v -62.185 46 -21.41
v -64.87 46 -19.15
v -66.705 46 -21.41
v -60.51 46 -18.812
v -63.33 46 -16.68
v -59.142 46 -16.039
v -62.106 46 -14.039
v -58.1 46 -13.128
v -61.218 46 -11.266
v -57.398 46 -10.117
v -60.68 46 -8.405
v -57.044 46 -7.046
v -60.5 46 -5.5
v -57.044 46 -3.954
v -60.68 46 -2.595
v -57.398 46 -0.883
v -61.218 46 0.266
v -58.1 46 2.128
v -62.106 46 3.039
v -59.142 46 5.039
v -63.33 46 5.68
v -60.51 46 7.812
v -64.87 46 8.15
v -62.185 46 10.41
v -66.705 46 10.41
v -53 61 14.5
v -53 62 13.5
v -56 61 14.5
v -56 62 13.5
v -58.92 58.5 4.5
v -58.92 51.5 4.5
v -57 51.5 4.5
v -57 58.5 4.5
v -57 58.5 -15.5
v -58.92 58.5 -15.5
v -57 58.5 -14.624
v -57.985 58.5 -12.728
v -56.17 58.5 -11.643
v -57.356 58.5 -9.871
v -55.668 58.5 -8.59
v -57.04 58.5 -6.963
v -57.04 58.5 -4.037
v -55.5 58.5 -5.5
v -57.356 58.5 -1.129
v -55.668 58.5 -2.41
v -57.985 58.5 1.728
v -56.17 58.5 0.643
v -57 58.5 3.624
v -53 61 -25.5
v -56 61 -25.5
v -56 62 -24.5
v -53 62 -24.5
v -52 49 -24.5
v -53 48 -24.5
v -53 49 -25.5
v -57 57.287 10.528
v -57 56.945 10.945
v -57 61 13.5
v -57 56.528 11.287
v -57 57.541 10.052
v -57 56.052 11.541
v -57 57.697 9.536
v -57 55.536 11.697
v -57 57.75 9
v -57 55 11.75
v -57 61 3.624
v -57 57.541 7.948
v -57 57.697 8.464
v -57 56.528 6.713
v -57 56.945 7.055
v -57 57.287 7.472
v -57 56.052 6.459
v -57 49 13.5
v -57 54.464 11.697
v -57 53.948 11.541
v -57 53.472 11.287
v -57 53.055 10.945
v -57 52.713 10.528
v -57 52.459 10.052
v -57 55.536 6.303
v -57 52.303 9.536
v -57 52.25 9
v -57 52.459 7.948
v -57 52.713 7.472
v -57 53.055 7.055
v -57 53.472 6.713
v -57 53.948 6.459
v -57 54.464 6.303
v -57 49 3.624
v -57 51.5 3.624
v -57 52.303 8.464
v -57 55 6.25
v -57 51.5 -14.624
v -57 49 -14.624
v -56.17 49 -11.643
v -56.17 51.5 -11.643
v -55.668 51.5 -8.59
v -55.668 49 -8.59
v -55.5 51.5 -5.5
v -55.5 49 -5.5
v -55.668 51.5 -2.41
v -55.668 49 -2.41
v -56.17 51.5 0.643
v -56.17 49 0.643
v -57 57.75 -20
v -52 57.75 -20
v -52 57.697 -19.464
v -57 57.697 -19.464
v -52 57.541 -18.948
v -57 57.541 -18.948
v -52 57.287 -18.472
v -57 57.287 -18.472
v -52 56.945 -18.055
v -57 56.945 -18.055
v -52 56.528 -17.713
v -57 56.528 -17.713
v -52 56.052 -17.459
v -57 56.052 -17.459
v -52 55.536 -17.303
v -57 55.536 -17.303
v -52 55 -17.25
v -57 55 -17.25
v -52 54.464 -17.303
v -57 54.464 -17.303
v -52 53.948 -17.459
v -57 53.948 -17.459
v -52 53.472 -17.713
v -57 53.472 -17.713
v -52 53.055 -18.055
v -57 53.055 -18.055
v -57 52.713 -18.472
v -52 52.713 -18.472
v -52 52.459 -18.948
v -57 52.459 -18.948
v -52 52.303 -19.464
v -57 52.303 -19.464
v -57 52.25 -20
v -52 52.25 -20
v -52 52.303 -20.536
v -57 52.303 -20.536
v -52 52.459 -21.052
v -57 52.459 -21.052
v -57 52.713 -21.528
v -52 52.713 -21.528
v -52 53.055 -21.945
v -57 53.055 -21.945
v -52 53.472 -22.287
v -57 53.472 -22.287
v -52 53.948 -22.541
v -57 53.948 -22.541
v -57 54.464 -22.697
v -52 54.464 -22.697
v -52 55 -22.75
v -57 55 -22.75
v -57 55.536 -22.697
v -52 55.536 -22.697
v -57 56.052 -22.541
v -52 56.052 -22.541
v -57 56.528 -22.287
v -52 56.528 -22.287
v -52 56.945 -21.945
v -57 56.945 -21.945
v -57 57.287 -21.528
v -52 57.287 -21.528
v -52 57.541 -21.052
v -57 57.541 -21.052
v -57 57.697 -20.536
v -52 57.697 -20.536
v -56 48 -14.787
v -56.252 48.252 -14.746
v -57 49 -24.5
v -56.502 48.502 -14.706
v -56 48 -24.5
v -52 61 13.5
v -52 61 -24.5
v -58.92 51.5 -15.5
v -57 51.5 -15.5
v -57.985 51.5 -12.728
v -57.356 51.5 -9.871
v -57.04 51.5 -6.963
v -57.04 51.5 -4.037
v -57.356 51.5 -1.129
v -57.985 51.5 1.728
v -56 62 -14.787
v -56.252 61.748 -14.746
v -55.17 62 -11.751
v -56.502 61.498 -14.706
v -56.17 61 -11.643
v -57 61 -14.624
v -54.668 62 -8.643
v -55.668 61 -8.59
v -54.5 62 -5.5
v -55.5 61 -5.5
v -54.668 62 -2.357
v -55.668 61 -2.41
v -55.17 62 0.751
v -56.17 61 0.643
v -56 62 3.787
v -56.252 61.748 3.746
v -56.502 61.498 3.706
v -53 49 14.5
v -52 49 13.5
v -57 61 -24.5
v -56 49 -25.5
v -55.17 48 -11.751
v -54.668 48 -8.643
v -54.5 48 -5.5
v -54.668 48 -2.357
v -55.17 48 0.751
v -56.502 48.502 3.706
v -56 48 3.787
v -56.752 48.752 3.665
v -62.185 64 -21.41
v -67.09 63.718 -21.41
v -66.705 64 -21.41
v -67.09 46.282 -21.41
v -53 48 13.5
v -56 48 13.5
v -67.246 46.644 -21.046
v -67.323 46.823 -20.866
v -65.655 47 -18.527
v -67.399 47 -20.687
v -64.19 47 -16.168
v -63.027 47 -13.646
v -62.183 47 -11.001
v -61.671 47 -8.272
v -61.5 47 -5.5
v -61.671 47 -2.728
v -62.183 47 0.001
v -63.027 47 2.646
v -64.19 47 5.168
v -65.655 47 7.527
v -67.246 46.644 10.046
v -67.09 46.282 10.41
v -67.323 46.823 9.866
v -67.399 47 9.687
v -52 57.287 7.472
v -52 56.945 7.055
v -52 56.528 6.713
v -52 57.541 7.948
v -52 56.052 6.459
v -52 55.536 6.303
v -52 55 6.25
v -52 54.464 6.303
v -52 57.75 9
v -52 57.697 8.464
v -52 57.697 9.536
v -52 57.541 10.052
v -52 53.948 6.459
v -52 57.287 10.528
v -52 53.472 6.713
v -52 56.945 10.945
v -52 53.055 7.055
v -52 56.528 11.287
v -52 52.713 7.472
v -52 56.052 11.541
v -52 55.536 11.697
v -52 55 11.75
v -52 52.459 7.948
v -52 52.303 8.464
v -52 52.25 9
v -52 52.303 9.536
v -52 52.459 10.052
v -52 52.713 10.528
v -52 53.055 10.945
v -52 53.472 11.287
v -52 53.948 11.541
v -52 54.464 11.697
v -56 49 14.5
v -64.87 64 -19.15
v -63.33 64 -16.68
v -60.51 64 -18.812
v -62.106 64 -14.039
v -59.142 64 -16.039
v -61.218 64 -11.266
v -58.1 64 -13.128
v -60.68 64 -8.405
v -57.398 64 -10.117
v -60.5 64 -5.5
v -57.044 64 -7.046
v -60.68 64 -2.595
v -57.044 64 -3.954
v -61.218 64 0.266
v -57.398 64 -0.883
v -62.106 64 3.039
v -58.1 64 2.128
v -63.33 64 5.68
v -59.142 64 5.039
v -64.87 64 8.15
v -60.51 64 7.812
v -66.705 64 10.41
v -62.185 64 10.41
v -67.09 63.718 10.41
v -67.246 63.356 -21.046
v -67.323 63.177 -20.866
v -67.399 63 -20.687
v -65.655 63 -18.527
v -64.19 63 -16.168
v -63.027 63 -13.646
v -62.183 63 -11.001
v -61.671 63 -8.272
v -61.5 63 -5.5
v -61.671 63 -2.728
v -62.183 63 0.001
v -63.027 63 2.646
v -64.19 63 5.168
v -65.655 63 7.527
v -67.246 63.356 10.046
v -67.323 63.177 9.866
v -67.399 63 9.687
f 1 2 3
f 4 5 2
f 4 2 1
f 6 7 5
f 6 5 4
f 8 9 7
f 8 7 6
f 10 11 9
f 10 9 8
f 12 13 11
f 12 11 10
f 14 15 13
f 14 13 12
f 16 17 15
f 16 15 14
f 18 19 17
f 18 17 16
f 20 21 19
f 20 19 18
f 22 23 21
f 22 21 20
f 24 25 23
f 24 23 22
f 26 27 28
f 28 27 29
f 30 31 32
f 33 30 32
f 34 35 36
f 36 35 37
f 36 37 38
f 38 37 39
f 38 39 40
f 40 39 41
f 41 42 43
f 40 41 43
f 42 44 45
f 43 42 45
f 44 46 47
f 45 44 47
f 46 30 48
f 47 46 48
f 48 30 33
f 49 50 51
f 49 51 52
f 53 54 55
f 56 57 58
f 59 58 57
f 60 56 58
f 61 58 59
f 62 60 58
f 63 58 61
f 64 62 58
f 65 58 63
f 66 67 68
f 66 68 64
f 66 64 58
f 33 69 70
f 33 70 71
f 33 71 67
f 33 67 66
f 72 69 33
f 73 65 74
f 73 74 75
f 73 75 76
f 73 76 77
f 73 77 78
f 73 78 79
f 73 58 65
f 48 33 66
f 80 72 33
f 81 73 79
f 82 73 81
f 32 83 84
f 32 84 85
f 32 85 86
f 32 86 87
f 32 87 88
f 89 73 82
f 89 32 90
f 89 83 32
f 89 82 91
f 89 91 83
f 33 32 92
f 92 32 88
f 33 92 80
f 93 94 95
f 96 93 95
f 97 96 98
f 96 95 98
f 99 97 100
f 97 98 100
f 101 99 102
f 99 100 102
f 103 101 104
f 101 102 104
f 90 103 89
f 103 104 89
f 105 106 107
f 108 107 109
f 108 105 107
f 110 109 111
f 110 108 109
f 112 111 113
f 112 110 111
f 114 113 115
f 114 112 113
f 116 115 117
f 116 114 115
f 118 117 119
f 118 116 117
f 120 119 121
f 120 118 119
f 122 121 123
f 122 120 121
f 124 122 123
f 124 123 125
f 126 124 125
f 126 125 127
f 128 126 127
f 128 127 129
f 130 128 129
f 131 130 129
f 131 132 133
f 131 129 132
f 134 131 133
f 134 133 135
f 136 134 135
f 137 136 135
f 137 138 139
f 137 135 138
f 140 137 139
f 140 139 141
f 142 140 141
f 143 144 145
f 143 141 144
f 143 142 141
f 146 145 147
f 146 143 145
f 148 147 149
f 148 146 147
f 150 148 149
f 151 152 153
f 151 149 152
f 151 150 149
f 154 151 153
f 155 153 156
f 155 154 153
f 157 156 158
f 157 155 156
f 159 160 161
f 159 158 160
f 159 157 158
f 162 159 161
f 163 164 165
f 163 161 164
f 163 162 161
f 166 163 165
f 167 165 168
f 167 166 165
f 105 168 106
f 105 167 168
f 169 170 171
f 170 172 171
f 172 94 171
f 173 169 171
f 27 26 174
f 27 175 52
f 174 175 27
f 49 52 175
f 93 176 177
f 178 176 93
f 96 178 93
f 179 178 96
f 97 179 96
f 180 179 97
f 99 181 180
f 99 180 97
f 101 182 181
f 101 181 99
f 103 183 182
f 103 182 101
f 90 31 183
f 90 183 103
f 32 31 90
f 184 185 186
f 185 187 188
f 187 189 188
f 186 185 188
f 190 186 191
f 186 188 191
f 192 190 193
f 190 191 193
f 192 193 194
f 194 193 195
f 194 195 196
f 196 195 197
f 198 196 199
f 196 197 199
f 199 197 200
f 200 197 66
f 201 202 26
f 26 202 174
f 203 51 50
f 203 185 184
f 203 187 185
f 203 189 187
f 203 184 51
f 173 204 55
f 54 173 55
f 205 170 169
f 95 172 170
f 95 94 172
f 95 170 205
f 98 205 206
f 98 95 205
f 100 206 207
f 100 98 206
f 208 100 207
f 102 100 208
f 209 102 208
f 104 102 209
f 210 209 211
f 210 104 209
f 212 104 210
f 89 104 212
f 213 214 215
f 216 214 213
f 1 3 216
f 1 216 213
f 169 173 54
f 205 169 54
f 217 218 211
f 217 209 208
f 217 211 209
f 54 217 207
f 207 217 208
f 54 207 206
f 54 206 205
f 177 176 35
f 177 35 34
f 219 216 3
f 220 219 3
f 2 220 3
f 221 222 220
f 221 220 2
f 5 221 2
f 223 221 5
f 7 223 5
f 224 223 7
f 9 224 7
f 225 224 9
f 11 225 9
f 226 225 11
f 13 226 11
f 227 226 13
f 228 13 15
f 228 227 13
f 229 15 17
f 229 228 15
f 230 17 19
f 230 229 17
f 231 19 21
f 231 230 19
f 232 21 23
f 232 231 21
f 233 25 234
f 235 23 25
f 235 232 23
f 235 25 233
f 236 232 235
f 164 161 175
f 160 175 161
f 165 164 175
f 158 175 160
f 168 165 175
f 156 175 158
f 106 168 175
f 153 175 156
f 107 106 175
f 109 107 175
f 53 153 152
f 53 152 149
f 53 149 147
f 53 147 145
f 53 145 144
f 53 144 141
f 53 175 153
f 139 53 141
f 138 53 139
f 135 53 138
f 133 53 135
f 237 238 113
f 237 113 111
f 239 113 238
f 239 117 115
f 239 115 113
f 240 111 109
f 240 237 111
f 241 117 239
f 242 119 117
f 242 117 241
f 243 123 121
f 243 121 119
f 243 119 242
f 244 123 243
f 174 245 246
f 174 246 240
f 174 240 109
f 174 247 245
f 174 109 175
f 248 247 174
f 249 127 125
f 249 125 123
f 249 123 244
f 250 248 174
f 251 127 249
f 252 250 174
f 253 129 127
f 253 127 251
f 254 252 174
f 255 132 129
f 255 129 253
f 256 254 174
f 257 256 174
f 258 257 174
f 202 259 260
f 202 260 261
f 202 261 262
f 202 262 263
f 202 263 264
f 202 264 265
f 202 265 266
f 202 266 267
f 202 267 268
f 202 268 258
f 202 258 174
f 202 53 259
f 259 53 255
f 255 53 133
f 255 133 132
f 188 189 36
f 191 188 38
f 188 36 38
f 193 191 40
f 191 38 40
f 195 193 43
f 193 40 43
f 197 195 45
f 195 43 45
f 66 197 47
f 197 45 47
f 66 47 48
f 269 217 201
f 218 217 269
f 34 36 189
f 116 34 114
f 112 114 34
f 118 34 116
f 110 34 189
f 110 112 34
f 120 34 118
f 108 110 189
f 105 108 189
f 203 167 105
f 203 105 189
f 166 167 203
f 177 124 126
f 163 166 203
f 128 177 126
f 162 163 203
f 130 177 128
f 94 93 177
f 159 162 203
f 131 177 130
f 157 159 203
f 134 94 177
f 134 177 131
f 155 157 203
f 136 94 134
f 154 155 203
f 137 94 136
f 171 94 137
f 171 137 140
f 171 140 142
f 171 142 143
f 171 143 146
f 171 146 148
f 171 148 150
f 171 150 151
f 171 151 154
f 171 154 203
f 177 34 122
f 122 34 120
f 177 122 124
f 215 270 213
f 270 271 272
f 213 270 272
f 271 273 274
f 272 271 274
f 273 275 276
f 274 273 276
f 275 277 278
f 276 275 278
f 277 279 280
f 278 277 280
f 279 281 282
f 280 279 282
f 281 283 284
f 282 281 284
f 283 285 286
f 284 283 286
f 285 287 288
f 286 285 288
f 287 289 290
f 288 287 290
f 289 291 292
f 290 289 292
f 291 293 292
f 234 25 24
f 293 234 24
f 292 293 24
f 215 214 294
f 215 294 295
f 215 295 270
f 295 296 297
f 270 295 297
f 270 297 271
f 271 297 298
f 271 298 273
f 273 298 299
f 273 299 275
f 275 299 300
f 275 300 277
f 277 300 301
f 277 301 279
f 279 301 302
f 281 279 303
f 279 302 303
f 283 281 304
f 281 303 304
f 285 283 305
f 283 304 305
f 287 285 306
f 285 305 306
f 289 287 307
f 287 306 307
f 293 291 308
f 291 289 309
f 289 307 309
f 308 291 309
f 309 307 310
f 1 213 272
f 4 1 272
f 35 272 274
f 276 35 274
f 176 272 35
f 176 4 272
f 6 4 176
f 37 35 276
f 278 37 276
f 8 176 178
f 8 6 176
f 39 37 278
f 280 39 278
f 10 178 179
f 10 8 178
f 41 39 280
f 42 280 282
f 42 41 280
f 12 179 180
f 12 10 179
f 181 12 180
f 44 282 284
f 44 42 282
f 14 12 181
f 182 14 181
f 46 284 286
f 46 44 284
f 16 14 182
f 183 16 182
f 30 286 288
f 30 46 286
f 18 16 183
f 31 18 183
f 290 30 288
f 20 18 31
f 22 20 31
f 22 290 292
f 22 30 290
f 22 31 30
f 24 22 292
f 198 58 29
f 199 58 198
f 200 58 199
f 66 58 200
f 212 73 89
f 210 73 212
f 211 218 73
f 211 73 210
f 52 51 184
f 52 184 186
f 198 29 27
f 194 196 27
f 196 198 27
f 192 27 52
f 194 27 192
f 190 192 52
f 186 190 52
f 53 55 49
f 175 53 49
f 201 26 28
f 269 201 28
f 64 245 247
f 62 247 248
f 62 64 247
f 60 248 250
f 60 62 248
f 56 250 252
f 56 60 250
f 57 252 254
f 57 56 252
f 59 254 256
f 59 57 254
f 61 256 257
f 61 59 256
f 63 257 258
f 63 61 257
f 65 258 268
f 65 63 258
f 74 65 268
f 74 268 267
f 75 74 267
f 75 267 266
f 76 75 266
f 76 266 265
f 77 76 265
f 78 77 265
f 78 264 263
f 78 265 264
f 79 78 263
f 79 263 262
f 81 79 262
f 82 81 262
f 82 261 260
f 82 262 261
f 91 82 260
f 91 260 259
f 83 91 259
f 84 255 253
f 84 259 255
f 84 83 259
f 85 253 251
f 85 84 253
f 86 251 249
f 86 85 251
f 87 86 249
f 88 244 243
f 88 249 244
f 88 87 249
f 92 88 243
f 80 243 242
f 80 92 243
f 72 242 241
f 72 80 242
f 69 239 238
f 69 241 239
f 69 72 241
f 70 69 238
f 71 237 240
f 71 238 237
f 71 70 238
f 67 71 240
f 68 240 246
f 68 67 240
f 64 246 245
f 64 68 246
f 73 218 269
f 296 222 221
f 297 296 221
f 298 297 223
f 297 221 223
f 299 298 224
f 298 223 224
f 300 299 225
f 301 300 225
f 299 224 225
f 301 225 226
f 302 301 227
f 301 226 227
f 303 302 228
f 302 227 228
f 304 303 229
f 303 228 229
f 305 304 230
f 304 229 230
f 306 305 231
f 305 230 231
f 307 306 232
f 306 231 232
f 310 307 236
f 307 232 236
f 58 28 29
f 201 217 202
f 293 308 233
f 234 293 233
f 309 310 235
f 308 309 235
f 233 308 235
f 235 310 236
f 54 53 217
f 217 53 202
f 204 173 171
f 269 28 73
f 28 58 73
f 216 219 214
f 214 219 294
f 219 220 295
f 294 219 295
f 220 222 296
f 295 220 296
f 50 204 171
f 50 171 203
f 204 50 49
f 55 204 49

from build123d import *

# Parameters (mm, degrees)
PAD017_DEPTH    = 9
SKETCH031_W     = 8.5
SKETCH031_H     = 20
PAD018_DEPTH    = 3.5
PAD019_DEPTH    = 7
SKETCH033_R     = 2.75
POCKET013_DEPTH = 5.001
CHAMFER014_SIZE = 1


with BuildPart() as part:
    # Sketch030 → Pad017 (new body, symmetric)
    with BuildSketch(Plane.XZ):
        with BuildLine():
            ThreePointArc((-62.185441, -21.409903), (-57, -5.5), (-62.185441, 10.409903))
            Line((-68.090097, 10.409903), (-62.185441, 10.409903))
            ThreePointArc((-68.090097, -21.409903), (-61.5, -5.5), (-68.090097, 10.409903))
            Line((-68.090097, -21.409903), (-62.185441, -21.409903))
        make_face()
    extrude(amount=PAD017_DEPTH, both=True)

    # Sketch031 → Pad018 (join, symmetric)
    with BuildSketch(Plane.XZ):
        with Locations((-56.25, -5.5)):
            Rectangle(SKETCH031_W, SKETCH031_H)
    extrude(amount=PAD018_DEPTH, both=True)

    # Sketch032 → Pad019 (join, symmetric)
    with BuildSketch(Plane.XZ):
        with BuildLine():
            Line((-52, 14.5), (-57, 14.5))
            Line((-57, 14.5), (-57, 3.624144))
            ThreePointArc((-57, -14.624144), (-55.5, -5.5), (-57, 3.624144))
            Line((-57, -14.624144), (-57, -25.5))
            Line((-57, -25.5), (-52, -25.5))
            Line((-52, -25.5), (-52, 14.5))
        make_face()
    extrude(amount=PAD019_DEPTH, both=True)

    # Sketch033 → Pocket013 (cut, through all)
    with BuildSketch(Plane.YZ.offset(-57)):
        with Locations((0, 9)):
            Circle(SKETCH033_R)
        with Locations((0, -20)):
            Circle(SKETCH033_R)
    extrude(amount=POCKET013_DEPTH, mode=Mode.SUBTRACT)

    # Chamfer014
    chamfer014_edges = [part.edges().sort_by_distance(p)[0] for p in [
        (-57, -7, -20.062072),
        (-54.5, -7, -25.5),
        (-52, -7, -5.5),
        (-54.5, -7, 14.5),
        (-57, -7, 9.062072),
        (-55.5, -7, -5.5),
        (-52, 0, 14.5),
        (-57, 0, 14.5),
        (-54.5, 7, 14.5),
        (-57, 7, -20.062072),
        (-54.5, 7, -25.5),
        (-52, 7, -5.5),
        (-57, 7, 9.062072),
        (-55.5, 7, -5.5),
        (-57, 0, -25.5),
        (-52, 0, -25.5),
        (-68.090097, 0, -21.409903),
        (-68.090097, 0, 10.409903),
        (-61.5, 9, -5.5),
        (-61.5, -9, -5.5),
    ]]
    chamfer(chamfer014_edges, length=CHAMFER014_SIZE)


with BuildPart() as part_1:
    # Body001008 placement: moved
    add(part.part.moved(Location((0, 55, 0))))


solid = part_1.part
